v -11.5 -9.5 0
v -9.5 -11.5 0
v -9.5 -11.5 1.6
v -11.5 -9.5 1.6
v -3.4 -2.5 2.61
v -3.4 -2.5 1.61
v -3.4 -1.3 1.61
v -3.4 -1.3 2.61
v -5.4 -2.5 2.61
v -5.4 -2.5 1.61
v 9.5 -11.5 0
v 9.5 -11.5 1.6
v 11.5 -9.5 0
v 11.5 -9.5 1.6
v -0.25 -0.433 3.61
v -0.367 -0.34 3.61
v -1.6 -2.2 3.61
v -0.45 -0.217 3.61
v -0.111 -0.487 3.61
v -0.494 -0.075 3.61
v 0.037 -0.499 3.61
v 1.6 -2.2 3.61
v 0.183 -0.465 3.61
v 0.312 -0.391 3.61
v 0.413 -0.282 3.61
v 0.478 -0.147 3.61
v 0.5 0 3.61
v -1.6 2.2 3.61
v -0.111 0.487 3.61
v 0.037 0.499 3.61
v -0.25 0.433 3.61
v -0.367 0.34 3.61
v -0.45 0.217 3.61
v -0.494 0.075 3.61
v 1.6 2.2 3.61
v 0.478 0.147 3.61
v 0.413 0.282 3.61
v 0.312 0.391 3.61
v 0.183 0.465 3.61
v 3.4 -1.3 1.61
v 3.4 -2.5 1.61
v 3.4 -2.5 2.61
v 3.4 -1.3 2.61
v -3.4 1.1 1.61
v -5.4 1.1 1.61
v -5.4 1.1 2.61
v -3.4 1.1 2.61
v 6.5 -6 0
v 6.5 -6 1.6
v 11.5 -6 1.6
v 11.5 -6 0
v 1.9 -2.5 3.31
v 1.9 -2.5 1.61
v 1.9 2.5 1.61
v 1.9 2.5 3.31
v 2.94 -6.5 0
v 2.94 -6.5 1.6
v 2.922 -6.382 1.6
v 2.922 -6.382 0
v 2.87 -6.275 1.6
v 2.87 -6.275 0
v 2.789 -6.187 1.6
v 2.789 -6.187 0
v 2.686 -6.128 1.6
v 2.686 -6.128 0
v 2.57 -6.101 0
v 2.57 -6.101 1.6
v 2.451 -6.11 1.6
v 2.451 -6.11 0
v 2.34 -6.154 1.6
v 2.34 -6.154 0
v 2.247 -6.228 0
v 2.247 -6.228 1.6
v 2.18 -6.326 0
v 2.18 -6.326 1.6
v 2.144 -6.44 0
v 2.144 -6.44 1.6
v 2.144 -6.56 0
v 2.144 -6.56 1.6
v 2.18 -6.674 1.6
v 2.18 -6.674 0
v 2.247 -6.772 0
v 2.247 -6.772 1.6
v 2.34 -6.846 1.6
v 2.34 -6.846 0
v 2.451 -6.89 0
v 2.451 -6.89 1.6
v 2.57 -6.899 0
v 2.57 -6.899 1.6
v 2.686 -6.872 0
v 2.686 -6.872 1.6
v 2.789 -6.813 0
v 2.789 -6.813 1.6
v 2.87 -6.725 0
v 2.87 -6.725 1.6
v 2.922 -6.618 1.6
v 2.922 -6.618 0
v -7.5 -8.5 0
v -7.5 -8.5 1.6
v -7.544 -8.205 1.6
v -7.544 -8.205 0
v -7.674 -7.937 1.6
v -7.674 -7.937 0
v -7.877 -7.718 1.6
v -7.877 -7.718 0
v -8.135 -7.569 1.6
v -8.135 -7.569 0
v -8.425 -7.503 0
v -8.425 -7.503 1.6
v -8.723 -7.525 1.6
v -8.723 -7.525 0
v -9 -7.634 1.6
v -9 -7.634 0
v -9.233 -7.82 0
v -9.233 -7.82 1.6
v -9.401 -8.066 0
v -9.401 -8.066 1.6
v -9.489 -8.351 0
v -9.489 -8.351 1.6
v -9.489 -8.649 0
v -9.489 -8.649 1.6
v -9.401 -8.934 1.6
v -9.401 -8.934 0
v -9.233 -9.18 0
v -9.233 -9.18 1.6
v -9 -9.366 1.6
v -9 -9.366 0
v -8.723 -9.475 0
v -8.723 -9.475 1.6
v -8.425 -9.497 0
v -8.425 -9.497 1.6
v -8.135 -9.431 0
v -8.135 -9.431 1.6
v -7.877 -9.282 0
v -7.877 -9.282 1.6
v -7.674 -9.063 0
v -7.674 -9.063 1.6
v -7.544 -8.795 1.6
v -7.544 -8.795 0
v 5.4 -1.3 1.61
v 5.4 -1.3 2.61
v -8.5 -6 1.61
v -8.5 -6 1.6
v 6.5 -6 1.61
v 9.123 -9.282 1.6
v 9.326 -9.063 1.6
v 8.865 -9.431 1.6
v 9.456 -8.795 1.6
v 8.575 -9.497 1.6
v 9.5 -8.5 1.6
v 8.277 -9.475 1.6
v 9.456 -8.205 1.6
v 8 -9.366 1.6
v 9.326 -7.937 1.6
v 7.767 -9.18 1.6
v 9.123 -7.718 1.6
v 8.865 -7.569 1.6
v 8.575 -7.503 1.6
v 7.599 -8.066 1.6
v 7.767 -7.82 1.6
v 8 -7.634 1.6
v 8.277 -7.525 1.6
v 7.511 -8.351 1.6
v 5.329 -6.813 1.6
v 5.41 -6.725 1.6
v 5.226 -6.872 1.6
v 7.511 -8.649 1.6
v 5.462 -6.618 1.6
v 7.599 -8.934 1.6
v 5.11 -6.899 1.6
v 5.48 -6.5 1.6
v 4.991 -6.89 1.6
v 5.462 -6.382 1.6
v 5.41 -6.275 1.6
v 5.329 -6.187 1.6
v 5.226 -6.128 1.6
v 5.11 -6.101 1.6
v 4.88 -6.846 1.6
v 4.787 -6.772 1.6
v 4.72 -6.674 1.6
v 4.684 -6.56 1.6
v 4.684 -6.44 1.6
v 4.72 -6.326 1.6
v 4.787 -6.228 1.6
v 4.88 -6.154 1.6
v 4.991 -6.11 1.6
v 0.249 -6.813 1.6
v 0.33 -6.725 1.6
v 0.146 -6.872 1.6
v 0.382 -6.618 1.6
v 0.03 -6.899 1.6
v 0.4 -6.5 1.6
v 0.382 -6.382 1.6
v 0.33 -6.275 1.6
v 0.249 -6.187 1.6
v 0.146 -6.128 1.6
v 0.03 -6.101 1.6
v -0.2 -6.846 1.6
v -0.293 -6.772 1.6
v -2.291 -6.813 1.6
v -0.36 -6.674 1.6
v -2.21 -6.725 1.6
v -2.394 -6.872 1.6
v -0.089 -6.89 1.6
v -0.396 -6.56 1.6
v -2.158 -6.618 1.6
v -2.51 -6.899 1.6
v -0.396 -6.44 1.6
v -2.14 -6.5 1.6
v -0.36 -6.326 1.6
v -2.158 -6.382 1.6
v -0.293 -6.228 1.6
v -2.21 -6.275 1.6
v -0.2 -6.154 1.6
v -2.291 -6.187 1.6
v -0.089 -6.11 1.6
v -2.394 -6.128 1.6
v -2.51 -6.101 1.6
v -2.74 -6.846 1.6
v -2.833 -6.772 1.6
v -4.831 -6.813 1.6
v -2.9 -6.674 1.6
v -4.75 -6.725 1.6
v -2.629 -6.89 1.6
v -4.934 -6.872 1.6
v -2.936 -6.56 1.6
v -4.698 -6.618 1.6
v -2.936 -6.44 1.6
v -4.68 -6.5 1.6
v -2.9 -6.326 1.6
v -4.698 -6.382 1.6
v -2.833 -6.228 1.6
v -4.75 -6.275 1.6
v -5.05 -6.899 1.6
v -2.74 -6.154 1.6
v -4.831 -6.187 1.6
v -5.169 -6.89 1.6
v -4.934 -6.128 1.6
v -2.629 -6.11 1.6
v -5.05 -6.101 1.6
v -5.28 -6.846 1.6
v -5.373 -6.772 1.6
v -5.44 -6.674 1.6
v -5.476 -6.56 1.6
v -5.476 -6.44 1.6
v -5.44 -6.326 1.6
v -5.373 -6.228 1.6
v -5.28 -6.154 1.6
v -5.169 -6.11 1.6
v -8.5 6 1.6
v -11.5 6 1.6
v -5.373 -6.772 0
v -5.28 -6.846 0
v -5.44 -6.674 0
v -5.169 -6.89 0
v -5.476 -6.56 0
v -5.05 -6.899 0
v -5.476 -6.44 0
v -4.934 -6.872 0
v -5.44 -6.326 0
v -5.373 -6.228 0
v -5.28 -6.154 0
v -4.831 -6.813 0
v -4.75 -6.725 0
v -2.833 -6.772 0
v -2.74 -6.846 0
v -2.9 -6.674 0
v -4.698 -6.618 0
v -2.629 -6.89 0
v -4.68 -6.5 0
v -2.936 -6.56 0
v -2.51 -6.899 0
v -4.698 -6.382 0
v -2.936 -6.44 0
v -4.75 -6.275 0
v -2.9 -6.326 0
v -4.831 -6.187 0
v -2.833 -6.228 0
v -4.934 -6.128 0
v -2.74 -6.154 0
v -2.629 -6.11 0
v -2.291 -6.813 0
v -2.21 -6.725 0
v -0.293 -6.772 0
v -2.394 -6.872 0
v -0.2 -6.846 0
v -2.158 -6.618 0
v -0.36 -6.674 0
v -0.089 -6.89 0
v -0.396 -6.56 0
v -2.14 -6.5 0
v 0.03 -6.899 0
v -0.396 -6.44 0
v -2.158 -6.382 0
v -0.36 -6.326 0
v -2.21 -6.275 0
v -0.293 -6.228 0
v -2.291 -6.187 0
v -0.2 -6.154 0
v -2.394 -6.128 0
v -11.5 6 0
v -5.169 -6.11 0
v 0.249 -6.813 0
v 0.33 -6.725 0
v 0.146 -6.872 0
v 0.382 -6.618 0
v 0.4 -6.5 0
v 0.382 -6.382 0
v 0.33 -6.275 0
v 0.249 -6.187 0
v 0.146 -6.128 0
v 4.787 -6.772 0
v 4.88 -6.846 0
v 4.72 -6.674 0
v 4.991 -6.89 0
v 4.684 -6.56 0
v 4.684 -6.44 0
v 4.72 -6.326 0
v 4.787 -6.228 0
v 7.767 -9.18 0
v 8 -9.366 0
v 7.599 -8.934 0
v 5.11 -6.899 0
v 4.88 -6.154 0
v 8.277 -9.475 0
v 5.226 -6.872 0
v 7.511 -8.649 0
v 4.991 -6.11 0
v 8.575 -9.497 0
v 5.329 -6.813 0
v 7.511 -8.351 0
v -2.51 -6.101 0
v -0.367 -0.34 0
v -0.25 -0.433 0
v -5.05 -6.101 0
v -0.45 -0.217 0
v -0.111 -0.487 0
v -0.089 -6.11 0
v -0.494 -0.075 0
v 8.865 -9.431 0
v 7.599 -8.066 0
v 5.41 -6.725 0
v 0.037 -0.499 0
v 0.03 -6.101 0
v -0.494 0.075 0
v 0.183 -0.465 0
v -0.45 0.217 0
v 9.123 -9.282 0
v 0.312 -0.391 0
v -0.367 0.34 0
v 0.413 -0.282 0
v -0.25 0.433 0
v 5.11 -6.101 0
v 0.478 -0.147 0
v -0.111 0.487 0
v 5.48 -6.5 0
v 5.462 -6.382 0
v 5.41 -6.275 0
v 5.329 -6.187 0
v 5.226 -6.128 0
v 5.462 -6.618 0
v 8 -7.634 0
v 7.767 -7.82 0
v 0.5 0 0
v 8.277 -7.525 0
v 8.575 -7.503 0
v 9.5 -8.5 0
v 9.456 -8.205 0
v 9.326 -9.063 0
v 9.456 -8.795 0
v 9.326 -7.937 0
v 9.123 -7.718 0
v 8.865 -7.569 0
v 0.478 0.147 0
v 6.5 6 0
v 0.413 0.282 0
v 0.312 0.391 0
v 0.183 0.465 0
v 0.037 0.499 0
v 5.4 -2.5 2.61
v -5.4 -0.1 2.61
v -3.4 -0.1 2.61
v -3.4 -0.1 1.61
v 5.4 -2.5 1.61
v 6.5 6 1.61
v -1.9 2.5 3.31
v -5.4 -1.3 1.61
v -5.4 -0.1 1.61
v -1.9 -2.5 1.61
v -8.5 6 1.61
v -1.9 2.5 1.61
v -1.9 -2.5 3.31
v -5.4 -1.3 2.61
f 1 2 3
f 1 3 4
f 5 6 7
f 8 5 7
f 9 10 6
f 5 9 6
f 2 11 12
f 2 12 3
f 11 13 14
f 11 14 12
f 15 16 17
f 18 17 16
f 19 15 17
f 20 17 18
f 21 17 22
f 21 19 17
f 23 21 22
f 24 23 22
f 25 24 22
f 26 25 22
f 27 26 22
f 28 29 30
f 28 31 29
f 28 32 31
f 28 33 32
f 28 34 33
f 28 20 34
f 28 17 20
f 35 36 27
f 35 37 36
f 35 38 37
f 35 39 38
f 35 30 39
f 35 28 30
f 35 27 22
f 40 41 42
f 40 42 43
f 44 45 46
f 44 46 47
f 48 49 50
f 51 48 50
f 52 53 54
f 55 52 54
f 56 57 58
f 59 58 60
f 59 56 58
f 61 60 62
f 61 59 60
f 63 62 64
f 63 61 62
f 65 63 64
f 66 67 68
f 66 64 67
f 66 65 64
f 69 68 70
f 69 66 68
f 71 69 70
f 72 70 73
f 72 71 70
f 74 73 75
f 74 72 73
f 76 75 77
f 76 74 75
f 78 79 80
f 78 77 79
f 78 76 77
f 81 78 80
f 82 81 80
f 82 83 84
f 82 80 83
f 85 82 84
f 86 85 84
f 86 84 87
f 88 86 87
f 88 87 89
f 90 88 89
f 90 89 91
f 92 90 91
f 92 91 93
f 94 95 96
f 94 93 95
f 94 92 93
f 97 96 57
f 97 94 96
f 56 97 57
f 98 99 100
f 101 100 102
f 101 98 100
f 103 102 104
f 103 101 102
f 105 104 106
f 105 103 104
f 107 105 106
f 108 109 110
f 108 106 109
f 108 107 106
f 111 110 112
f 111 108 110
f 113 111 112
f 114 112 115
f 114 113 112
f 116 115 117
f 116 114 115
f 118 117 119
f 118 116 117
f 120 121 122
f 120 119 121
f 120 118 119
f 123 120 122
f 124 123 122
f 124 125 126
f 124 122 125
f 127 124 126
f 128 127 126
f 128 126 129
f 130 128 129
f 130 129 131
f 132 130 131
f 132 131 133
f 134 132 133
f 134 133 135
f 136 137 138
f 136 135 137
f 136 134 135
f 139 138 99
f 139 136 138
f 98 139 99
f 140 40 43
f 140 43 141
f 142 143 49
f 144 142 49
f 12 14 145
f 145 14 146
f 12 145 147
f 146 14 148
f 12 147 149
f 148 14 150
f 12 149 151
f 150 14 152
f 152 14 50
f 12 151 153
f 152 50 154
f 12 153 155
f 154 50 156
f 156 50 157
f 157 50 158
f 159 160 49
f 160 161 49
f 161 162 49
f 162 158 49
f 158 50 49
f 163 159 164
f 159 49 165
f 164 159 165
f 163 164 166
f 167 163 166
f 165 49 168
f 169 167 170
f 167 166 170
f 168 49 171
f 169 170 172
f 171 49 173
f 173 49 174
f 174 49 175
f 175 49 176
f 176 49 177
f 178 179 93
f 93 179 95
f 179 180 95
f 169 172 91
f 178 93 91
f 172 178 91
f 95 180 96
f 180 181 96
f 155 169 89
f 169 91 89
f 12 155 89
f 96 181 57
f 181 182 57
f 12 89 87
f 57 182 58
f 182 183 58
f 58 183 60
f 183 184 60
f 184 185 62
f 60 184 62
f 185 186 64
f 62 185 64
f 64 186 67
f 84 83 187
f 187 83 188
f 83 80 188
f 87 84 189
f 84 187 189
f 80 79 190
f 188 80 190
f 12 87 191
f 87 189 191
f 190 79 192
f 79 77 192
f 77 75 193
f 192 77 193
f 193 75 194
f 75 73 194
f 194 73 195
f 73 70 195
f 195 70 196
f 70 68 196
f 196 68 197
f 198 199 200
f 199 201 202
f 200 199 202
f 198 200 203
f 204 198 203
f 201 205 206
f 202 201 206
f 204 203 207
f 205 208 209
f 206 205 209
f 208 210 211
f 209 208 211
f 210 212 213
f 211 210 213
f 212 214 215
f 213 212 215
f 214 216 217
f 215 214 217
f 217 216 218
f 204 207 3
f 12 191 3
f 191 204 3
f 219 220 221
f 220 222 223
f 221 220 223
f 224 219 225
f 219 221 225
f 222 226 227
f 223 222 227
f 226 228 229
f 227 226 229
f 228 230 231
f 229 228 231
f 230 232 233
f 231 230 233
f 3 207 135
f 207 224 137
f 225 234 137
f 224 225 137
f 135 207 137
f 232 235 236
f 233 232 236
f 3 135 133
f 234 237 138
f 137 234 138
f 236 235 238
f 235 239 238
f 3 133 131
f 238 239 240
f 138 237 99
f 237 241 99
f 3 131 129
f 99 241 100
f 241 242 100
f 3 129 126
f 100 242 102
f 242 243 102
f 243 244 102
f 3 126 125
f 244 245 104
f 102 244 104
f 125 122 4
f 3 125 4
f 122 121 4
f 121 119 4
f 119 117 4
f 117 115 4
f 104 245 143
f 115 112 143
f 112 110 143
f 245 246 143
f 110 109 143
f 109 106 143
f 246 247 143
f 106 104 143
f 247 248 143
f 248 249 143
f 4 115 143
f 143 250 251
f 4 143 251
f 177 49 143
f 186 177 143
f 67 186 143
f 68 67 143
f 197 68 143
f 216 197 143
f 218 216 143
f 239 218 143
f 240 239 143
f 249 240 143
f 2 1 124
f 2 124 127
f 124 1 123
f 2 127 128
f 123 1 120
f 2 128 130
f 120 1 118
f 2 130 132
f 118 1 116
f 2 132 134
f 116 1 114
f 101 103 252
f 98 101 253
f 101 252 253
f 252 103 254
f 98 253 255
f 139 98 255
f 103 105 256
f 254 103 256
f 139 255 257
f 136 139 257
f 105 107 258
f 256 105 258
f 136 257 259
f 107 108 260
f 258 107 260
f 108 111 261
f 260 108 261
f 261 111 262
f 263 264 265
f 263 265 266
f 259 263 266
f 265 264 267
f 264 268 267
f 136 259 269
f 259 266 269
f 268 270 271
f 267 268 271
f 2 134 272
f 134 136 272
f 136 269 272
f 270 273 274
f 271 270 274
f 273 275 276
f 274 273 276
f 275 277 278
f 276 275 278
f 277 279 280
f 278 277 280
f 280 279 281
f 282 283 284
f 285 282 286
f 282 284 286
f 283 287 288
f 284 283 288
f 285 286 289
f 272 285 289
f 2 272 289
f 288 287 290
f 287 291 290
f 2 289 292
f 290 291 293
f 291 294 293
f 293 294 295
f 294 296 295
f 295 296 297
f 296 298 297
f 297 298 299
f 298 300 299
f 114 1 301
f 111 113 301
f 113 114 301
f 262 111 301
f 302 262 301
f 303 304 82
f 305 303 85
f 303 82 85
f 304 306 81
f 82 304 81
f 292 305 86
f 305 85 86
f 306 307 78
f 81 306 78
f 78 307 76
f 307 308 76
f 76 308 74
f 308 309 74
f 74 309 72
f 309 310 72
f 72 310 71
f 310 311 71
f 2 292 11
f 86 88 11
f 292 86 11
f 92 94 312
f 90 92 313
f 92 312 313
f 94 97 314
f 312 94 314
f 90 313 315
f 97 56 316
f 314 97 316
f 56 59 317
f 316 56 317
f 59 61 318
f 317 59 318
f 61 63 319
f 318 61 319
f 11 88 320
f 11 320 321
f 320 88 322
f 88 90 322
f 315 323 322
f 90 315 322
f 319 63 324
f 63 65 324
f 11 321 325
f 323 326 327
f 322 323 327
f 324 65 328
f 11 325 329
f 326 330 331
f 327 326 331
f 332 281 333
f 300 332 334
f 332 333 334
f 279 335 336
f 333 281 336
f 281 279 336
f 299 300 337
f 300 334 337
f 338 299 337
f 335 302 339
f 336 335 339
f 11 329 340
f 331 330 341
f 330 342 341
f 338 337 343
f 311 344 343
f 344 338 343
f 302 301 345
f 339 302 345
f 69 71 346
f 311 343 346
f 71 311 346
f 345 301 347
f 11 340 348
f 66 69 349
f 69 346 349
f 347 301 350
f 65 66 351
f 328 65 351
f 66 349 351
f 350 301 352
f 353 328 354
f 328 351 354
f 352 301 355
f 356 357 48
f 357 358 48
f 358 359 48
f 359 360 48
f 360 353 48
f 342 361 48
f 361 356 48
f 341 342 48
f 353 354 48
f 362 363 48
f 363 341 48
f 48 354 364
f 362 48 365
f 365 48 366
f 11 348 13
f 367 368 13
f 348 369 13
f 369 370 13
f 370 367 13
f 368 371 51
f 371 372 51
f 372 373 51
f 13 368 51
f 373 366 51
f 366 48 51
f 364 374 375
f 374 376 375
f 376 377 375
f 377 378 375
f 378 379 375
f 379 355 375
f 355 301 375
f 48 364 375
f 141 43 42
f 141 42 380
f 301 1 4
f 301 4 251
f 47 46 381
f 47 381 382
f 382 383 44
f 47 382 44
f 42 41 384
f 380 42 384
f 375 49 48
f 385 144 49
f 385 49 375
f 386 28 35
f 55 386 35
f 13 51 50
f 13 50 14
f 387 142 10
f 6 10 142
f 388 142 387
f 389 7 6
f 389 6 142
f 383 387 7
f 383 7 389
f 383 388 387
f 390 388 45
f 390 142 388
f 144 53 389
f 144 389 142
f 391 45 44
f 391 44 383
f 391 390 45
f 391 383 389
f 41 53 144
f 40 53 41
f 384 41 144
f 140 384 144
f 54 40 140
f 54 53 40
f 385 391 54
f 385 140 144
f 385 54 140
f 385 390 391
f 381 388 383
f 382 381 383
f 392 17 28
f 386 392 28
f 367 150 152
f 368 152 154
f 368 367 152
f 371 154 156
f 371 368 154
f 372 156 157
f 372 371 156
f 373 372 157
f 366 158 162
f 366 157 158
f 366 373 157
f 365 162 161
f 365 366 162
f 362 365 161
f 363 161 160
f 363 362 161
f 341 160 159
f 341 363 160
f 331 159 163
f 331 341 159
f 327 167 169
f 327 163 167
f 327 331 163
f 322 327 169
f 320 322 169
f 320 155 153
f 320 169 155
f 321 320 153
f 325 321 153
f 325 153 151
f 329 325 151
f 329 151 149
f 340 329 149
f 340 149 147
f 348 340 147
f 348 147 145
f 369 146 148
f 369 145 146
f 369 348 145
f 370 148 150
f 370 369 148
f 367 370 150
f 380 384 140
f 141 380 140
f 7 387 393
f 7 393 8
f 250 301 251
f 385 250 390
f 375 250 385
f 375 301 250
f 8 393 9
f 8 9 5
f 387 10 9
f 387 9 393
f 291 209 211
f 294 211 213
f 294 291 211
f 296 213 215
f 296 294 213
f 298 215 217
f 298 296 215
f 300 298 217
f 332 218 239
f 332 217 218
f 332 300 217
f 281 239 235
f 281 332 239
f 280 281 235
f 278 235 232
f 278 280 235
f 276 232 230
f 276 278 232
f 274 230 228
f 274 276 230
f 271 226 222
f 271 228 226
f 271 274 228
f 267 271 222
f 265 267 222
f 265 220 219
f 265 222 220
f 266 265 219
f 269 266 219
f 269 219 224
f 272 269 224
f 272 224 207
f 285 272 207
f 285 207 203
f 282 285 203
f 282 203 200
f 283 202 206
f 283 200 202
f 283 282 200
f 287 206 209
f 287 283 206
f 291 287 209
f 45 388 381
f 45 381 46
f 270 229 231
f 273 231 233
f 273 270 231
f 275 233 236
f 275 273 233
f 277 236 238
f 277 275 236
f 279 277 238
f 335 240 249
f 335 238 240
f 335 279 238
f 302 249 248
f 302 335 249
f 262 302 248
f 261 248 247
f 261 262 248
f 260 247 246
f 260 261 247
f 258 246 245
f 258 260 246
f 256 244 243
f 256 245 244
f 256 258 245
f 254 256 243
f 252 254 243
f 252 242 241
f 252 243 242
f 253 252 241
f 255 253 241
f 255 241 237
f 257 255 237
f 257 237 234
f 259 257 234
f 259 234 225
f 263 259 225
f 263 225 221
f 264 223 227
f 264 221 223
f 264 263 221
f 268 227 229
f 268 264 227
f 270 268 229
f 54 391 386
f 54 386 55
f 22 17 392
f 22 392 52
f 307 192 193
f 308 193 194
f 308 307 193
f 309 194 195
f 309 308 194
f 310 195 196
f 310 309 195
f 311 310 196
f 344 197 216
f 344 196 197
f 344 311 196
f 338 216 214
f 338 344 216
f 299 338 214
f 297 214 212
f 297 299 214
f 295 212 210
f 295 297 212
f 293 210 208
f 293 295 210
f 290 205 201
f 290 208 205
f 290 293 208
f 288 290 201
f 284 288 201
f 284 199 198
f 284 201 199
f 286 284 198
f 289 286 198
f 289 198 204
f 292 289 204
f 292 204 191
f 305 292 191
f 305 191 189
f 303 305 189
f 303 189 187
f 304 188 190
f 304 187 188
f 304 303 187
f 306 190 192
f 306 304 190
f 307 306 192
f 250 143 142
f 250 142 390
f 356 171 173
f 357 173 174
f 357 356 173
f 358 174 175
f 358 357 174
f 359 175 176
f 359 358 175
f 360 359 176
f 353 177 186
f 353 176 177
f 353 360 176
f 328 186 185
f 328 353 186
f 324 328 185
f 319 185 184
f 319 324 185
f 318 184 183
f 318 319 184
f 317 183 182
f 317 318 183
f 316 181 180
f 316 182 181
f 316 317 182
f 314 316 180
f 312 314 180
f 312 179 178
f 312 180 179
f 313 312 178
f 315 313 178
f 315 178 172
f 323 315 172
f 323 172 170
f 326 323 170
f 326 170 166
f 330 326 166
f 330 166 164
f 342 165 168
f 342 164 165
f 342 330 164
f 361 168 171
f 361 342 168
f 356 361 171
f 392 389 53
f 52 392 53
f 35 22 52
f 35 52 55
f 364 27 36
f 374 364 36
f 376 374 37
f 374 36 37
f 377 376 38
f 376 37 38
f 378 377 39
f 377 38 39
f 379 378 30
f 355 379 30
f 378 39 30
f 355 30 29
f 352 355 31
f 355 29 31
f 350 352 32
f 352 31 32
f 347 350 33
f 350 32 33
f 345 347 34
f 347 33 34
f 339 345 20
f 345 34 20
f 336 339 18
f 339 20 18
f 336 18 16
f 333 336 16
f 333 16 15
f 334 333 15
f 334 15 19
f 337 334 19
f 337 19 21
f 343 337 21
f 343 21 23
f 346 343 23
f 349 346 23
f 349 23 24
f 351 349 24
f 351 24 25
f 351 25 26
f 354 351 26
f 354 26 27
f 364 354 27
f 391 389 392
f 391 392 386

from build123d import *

# Parameters (mm, degrees)
BOSS_EXTRUDE1_DEPTH = 1.6
SKETCH2_W           = 17
SKETCH2_H           = 12
BOSS_EXTRUDE2_DEPTH = 1.61
SKETCH3_R           = 0.4
CUT_EXTRUDE1_DEPTH  = 2.62
BOSS_EXTRUDE4_START = 1.61
SKETCH4_W           = 3.8
SKETCH4_H           = 5
BOSS_EXTRUDE4_DEPTH = 2
BOSS_EXTRUDE5_START = 1.61
SKETCH5_W           = 2
SKETCH5_H           = 1.2
BOSS_EXTRUDE5_DEPTH = 1
CHAMFER1_SIZE       = 0.3
SKETCH8_R           = 1
CUT_EXTRUDE2_DEPTH  = 3.5
SKETCH9_W           = 23
SKETCH9_H           = 5.5
CUT_EXTRUDE3_DEPTH  = 3.5
SKETCH10_W          = 5
SKETCH10_H          = 12
CUT_EXTRUDE4_DEPTH  = 3.5
CUT_EXTRUDE5_START  = 3.61
SKETCH11_R          = 0.5
CUT_EXTRUDE5_DEPTH  = 5


with BuildPart() as part:
    # Sketch1 → Boss-Extrude1 (new body)
    with BuildSketch(Plane.XY):
        Polygon((-11.5, 9.5), (-9.5, 11.5), (9.5, 11.5), (11.5, 9.5), (11.5, -9.5), (9.5, -11.5), (-9.5, -11.5), (-11.5, -9.5), align=None)
    extrude(amount=BOSS_EXTRUDE1_DEPTH)

    # Sketch2 → Boss-Extrude2 (add)
    with BuildSketch(Plane.XY):
        Rectangle(SKETCH2_W, SKETCH2_H)
    extrude(amount=BOSS_EXTRUDE2_DEPTH)

    # Sketch3 → Cut-Extrude1 (cut)
    with BuildSketch(Plane.XY):
        with Locations((-5.08, -6.5)):
            Circle(SKETCH3_R)
        with Locations((-2.54, -6.5)):
            Circle(SKETCH3_R)
        with Locations((0, -6.5)):
            Circle(SKETCH3_R)
        with Locations((2.54, -6.5)):
            Circle(SKETCH3_R)
        with Locations((5.08, -6.5)):
            Circle(SKETCH3_R)
    extrude(amount=CUT_EXTRUDE1_DEPTH, mode=Mode.SUBTRACT)

    # Sketch4 → Boss-Extrude4 (add)
    with BuildSketch(Plane.XY.offset(BOSS_EXTRUDE4_START)):
        Rectangle(SKETCH4_W, SKETCH4_H)
    extrude(amount=BOSS_EXTRUDE4_DEPTH)

    # Sketch5 → Boss-Extrude5 (add)
    with BuildSketch(Plane.XY.offset(BOSS_EXTRUDE5_START)):
        with Locations((-4.4, -1.9)):
            Rectangle(SKETCH5_W, SKETCH5_H)
        with Locations((-4.4, 0.5)):
            Rectangle(SKETCH5_W, SKETCH5_H)
        with Locations((4.4, -1.9)):
            Rectangle(SKETCH5_W, SKETCH5_H)
    extrude(amount=BOSS_EXTRUDE5_DEPTH)

    # Chamfer1
    chamfer1_edges = [part.edges().sort_by_distance(p)[0] for p in [
        (1.9, 0, 3.61),
        (0, 2.5, 3.61),
        (-1.9, 0, 3.61),
        (0, -2.5, 3.61),
    ]]
    chamfer(chamfer1_edges, length=CHAMFER1_SIZE)

    # Sketch8 → Cut-Extrude2 (cut, symmetric)
    with BuildSketch(Plane.XY):
        with Locations((8.5, -8.5)):
            Circle(SKETCH8_R)
        with Locations((-8.5, -8.5)):
            Circle(SKETCH8_R)
        with Locations((8.5, 8.5)):
            Circle(SKETCH8_R)
        with Locations((-8.5, 8.5)):
            Circle(SKETCH8_R)
    extrude(amount=CUT_EXTRUDE2_DEPTH, both=True, mode=Mode.SUBTRACT)

    # Sketch9 → Cut-Extrude3 (cut, symmetric)
    with BuildSketch(Plane.XY):
        with Locations((0, 8.75)):
            Rectangle(SKETCH9_W, SKETCH9_H)
    extrude(amount=CUT_EXTRUDE3_DEPTH, both=True, mode=Mode.SUBTRACT)

    # Sketch10 → Cut-Extrude4 (cut, symmetric)
    with BuildSketch(Plane.XY):
        with Locations((9, 0)):
            Rectangle(SKETCH10_W, SKETCH10_H)
    extrude(amount=CUT_EXTRUDE4_DEPTH, both=True, mode=Mode.SUBTRACT)

    # Sketch11 → Cut-Extrude5 (cut)
    with BuildSketch(Plane.XY.offset(CUT_EXTRUDE5_START)):
        Circle(SKETCH11_R)
    extrude(amount=-CUT_EXTRUDE5_DEPTH, mode=Mode.SUBTRACT)


solid = part.part
